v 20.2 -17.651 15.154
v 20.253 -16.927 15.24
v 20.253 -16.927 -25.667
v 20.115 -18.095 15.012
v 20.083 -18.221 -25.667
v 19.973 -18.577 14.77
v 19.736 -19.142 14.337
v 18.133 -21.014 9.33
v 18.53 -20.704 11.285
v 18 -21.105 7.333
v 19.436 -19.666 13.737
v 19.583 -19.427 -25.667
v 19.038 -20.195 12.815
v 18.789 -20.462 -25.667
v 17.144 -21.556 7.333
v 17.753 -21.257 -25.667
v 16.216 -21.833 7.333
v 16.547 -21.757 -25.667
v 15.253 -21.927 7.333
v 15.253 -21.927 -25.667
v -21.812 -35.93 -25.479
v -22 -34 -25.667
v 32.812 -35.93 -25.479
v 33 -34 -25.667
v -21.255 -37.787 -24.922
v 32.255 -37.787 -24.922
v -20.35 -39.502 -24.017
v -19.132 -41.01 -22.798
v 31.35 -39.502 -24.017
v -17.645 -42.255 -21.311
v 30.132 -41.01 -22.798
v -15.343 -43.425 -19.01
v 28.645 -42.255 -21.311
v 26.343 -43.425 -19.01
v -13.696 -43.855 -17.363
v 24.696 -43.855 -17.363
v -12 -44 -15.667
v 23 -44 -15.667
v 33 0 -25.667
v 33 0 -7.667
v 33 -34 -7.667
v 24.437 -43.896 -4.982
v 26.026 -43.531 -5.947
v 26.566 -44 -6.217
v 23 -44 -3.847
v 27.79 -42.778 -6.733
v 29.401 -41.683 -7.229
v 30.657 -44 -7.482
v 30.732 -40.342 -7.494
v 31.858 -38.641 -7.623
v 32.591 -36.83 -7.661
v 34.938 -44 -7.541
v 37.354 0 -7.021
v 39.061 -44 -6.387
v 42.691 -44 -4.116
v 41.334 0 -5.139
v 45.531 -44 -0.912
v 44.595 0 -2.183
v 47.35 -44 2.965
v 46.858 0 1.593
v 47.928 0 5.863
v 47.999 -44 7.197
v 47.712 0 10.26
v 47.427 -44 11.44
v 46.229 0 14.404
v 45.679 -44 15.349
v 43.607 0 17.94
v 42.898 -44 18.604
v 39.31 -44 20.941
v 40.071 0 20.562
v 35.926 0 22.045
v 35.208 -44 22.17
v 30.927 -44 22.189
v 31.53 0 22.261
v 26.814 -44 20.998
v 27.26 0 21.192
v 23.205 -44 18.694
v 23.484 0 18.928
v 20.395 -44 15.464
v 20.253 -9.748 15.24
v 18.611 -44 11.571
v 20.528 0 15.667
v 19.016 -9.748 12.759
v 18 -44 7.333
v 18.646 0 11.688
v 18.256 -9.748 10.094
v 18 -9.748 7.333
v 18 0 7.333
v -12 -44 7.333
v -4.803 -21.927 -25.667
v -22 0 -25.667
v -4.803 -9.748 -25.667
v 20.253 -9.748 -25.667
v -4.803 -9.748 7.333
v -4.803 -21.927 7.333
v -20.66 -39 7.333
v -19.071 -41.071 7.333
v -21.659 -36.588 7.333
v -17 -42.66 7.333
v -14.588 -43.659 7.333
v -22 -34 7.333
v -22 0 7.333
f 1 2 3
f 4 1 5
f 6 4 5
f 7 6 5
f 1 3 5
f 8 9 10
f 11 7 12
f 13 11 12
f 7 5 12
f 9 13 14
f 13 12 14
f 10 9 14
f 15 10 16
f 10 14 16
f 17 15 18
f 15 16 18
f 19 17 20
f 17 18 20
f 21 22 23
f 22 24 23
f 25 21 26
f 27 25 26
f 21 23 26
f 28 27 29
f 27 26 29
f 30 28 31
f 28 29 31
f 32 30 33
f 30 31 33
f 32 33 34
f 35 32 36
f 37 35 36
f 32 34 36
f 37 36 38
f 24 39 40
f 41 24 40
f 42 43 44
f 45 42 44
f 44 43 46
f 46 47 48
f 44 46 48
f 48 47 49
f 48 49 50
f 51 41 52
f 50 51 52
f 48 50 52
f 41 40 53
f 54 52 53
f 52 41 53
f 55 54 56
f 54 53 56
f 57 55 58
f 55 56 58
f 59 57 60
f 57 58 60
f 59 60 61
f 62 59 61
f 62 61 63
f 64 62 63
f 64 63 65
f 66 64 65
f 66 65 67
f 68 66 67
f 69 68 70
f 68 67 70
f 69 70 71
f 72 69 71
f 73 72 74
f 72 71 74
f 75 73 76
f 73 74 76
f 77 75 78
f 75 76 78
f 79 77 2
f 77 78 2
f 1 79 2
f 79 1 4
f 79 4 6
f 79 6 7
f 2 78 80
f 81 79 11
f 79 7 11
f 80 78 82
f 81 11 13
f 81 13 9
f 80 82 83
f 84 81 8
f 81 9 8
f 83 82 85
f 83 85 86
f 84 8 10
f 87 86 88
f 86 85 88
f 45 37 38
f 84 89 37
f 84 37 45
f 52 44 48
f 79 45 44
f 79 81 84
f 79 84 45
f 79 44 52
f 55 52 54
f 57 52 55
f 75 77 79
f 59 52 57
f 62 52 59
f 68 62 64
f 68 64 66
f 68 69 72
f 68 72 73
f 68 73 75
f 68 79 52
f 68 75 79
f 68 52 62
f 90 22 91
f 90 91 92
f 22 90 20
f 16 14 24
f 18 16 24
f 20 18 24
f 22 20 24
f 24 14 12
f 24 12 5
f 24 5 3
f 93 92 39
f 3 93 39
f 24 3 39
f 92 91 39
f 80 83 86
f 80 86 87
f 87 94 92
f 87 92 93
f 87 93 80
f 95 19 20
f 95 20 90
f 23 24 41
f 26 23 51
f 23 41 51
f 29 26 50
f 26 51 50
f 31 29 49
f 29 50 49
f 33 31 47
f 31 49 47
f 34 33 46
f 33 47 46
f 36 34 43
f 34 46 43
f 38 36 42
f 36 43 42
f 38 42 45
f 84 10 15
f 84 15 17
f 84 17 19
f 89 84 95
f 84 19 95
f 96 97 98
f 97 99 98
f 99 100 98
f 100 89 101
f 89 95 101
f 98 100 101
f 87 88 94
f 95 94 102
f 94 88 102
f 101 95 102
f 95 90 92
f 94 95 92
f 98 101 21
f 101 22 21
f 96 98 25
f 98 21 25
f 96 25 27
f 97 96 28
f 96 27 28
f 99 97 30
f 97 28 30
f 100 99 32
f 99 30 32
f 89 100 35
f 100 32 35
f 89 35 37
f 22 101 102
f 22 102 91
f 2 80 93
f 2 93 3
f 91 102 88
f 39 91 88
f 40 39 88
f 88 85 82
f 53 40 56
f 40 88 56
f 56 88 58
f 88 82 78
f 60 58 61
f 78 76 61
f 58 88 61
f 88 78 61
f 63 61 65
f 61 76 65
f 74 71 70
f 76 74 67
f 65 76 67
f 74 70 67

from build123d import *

# Parameters (mm, degrees)
F1_DEPTH = 44
F2_R     = 10
F4_DEPTH = 50.9


with BuildPart() as f1:
    # F0 (on Front) → F1 (new body)
    with BuildSketch(Plane.XZ):
        with BuildLine():
            Line((18, 7.333334), (-22, 7.333334))
            Line((-22, 7.333334), (-22, -25.666667))
            Line((-22, -25.666667), (33, -25.666667))
            Line((33, -25.666667), (33, -7.666666))
            ThreePointArc((33, -7.666666), (43.606602, 17.939935), (18, 7.333334))
        make_face()
    extrude(amount=F1_DEPTH)

    # F2
    f2_edges = [f1.edges().sort_by_distance(p)[0] for p in [
        (5.5, -44, -25.666667),
        (33, -44, -16.666667),
        (-22, -44, -9.166667),
    ]]
    fillet(f2_edges, radius=F2_R)

    # F3 (on face) → F4 (cut)
    with BuildSketch(Plane(origin=(0, 0, -25.666667), x_dir=(1, 0, 0), z_dir=(0, 0, -1))):
        with BuildLine():
            Line((15.25307, 21.926958), (-4.803377, 21.926958))
            Line((-4.803377, 21.926958), (-4.803377, 9.747743))
            Line((-4.803377, 9.747743), (20.25307, 9.747743))
            Line((20.25307, 9.747743), (20.25307, 16.926958))
            ThreePointArc((20.25307, 16.926958), (18.788604, 20.462492), (15.25307, 21.926958))
        make_face()
    extrude(amount=-F4_DEPTH, mode=Mode.SUBTRACT)


solid = f1.part
